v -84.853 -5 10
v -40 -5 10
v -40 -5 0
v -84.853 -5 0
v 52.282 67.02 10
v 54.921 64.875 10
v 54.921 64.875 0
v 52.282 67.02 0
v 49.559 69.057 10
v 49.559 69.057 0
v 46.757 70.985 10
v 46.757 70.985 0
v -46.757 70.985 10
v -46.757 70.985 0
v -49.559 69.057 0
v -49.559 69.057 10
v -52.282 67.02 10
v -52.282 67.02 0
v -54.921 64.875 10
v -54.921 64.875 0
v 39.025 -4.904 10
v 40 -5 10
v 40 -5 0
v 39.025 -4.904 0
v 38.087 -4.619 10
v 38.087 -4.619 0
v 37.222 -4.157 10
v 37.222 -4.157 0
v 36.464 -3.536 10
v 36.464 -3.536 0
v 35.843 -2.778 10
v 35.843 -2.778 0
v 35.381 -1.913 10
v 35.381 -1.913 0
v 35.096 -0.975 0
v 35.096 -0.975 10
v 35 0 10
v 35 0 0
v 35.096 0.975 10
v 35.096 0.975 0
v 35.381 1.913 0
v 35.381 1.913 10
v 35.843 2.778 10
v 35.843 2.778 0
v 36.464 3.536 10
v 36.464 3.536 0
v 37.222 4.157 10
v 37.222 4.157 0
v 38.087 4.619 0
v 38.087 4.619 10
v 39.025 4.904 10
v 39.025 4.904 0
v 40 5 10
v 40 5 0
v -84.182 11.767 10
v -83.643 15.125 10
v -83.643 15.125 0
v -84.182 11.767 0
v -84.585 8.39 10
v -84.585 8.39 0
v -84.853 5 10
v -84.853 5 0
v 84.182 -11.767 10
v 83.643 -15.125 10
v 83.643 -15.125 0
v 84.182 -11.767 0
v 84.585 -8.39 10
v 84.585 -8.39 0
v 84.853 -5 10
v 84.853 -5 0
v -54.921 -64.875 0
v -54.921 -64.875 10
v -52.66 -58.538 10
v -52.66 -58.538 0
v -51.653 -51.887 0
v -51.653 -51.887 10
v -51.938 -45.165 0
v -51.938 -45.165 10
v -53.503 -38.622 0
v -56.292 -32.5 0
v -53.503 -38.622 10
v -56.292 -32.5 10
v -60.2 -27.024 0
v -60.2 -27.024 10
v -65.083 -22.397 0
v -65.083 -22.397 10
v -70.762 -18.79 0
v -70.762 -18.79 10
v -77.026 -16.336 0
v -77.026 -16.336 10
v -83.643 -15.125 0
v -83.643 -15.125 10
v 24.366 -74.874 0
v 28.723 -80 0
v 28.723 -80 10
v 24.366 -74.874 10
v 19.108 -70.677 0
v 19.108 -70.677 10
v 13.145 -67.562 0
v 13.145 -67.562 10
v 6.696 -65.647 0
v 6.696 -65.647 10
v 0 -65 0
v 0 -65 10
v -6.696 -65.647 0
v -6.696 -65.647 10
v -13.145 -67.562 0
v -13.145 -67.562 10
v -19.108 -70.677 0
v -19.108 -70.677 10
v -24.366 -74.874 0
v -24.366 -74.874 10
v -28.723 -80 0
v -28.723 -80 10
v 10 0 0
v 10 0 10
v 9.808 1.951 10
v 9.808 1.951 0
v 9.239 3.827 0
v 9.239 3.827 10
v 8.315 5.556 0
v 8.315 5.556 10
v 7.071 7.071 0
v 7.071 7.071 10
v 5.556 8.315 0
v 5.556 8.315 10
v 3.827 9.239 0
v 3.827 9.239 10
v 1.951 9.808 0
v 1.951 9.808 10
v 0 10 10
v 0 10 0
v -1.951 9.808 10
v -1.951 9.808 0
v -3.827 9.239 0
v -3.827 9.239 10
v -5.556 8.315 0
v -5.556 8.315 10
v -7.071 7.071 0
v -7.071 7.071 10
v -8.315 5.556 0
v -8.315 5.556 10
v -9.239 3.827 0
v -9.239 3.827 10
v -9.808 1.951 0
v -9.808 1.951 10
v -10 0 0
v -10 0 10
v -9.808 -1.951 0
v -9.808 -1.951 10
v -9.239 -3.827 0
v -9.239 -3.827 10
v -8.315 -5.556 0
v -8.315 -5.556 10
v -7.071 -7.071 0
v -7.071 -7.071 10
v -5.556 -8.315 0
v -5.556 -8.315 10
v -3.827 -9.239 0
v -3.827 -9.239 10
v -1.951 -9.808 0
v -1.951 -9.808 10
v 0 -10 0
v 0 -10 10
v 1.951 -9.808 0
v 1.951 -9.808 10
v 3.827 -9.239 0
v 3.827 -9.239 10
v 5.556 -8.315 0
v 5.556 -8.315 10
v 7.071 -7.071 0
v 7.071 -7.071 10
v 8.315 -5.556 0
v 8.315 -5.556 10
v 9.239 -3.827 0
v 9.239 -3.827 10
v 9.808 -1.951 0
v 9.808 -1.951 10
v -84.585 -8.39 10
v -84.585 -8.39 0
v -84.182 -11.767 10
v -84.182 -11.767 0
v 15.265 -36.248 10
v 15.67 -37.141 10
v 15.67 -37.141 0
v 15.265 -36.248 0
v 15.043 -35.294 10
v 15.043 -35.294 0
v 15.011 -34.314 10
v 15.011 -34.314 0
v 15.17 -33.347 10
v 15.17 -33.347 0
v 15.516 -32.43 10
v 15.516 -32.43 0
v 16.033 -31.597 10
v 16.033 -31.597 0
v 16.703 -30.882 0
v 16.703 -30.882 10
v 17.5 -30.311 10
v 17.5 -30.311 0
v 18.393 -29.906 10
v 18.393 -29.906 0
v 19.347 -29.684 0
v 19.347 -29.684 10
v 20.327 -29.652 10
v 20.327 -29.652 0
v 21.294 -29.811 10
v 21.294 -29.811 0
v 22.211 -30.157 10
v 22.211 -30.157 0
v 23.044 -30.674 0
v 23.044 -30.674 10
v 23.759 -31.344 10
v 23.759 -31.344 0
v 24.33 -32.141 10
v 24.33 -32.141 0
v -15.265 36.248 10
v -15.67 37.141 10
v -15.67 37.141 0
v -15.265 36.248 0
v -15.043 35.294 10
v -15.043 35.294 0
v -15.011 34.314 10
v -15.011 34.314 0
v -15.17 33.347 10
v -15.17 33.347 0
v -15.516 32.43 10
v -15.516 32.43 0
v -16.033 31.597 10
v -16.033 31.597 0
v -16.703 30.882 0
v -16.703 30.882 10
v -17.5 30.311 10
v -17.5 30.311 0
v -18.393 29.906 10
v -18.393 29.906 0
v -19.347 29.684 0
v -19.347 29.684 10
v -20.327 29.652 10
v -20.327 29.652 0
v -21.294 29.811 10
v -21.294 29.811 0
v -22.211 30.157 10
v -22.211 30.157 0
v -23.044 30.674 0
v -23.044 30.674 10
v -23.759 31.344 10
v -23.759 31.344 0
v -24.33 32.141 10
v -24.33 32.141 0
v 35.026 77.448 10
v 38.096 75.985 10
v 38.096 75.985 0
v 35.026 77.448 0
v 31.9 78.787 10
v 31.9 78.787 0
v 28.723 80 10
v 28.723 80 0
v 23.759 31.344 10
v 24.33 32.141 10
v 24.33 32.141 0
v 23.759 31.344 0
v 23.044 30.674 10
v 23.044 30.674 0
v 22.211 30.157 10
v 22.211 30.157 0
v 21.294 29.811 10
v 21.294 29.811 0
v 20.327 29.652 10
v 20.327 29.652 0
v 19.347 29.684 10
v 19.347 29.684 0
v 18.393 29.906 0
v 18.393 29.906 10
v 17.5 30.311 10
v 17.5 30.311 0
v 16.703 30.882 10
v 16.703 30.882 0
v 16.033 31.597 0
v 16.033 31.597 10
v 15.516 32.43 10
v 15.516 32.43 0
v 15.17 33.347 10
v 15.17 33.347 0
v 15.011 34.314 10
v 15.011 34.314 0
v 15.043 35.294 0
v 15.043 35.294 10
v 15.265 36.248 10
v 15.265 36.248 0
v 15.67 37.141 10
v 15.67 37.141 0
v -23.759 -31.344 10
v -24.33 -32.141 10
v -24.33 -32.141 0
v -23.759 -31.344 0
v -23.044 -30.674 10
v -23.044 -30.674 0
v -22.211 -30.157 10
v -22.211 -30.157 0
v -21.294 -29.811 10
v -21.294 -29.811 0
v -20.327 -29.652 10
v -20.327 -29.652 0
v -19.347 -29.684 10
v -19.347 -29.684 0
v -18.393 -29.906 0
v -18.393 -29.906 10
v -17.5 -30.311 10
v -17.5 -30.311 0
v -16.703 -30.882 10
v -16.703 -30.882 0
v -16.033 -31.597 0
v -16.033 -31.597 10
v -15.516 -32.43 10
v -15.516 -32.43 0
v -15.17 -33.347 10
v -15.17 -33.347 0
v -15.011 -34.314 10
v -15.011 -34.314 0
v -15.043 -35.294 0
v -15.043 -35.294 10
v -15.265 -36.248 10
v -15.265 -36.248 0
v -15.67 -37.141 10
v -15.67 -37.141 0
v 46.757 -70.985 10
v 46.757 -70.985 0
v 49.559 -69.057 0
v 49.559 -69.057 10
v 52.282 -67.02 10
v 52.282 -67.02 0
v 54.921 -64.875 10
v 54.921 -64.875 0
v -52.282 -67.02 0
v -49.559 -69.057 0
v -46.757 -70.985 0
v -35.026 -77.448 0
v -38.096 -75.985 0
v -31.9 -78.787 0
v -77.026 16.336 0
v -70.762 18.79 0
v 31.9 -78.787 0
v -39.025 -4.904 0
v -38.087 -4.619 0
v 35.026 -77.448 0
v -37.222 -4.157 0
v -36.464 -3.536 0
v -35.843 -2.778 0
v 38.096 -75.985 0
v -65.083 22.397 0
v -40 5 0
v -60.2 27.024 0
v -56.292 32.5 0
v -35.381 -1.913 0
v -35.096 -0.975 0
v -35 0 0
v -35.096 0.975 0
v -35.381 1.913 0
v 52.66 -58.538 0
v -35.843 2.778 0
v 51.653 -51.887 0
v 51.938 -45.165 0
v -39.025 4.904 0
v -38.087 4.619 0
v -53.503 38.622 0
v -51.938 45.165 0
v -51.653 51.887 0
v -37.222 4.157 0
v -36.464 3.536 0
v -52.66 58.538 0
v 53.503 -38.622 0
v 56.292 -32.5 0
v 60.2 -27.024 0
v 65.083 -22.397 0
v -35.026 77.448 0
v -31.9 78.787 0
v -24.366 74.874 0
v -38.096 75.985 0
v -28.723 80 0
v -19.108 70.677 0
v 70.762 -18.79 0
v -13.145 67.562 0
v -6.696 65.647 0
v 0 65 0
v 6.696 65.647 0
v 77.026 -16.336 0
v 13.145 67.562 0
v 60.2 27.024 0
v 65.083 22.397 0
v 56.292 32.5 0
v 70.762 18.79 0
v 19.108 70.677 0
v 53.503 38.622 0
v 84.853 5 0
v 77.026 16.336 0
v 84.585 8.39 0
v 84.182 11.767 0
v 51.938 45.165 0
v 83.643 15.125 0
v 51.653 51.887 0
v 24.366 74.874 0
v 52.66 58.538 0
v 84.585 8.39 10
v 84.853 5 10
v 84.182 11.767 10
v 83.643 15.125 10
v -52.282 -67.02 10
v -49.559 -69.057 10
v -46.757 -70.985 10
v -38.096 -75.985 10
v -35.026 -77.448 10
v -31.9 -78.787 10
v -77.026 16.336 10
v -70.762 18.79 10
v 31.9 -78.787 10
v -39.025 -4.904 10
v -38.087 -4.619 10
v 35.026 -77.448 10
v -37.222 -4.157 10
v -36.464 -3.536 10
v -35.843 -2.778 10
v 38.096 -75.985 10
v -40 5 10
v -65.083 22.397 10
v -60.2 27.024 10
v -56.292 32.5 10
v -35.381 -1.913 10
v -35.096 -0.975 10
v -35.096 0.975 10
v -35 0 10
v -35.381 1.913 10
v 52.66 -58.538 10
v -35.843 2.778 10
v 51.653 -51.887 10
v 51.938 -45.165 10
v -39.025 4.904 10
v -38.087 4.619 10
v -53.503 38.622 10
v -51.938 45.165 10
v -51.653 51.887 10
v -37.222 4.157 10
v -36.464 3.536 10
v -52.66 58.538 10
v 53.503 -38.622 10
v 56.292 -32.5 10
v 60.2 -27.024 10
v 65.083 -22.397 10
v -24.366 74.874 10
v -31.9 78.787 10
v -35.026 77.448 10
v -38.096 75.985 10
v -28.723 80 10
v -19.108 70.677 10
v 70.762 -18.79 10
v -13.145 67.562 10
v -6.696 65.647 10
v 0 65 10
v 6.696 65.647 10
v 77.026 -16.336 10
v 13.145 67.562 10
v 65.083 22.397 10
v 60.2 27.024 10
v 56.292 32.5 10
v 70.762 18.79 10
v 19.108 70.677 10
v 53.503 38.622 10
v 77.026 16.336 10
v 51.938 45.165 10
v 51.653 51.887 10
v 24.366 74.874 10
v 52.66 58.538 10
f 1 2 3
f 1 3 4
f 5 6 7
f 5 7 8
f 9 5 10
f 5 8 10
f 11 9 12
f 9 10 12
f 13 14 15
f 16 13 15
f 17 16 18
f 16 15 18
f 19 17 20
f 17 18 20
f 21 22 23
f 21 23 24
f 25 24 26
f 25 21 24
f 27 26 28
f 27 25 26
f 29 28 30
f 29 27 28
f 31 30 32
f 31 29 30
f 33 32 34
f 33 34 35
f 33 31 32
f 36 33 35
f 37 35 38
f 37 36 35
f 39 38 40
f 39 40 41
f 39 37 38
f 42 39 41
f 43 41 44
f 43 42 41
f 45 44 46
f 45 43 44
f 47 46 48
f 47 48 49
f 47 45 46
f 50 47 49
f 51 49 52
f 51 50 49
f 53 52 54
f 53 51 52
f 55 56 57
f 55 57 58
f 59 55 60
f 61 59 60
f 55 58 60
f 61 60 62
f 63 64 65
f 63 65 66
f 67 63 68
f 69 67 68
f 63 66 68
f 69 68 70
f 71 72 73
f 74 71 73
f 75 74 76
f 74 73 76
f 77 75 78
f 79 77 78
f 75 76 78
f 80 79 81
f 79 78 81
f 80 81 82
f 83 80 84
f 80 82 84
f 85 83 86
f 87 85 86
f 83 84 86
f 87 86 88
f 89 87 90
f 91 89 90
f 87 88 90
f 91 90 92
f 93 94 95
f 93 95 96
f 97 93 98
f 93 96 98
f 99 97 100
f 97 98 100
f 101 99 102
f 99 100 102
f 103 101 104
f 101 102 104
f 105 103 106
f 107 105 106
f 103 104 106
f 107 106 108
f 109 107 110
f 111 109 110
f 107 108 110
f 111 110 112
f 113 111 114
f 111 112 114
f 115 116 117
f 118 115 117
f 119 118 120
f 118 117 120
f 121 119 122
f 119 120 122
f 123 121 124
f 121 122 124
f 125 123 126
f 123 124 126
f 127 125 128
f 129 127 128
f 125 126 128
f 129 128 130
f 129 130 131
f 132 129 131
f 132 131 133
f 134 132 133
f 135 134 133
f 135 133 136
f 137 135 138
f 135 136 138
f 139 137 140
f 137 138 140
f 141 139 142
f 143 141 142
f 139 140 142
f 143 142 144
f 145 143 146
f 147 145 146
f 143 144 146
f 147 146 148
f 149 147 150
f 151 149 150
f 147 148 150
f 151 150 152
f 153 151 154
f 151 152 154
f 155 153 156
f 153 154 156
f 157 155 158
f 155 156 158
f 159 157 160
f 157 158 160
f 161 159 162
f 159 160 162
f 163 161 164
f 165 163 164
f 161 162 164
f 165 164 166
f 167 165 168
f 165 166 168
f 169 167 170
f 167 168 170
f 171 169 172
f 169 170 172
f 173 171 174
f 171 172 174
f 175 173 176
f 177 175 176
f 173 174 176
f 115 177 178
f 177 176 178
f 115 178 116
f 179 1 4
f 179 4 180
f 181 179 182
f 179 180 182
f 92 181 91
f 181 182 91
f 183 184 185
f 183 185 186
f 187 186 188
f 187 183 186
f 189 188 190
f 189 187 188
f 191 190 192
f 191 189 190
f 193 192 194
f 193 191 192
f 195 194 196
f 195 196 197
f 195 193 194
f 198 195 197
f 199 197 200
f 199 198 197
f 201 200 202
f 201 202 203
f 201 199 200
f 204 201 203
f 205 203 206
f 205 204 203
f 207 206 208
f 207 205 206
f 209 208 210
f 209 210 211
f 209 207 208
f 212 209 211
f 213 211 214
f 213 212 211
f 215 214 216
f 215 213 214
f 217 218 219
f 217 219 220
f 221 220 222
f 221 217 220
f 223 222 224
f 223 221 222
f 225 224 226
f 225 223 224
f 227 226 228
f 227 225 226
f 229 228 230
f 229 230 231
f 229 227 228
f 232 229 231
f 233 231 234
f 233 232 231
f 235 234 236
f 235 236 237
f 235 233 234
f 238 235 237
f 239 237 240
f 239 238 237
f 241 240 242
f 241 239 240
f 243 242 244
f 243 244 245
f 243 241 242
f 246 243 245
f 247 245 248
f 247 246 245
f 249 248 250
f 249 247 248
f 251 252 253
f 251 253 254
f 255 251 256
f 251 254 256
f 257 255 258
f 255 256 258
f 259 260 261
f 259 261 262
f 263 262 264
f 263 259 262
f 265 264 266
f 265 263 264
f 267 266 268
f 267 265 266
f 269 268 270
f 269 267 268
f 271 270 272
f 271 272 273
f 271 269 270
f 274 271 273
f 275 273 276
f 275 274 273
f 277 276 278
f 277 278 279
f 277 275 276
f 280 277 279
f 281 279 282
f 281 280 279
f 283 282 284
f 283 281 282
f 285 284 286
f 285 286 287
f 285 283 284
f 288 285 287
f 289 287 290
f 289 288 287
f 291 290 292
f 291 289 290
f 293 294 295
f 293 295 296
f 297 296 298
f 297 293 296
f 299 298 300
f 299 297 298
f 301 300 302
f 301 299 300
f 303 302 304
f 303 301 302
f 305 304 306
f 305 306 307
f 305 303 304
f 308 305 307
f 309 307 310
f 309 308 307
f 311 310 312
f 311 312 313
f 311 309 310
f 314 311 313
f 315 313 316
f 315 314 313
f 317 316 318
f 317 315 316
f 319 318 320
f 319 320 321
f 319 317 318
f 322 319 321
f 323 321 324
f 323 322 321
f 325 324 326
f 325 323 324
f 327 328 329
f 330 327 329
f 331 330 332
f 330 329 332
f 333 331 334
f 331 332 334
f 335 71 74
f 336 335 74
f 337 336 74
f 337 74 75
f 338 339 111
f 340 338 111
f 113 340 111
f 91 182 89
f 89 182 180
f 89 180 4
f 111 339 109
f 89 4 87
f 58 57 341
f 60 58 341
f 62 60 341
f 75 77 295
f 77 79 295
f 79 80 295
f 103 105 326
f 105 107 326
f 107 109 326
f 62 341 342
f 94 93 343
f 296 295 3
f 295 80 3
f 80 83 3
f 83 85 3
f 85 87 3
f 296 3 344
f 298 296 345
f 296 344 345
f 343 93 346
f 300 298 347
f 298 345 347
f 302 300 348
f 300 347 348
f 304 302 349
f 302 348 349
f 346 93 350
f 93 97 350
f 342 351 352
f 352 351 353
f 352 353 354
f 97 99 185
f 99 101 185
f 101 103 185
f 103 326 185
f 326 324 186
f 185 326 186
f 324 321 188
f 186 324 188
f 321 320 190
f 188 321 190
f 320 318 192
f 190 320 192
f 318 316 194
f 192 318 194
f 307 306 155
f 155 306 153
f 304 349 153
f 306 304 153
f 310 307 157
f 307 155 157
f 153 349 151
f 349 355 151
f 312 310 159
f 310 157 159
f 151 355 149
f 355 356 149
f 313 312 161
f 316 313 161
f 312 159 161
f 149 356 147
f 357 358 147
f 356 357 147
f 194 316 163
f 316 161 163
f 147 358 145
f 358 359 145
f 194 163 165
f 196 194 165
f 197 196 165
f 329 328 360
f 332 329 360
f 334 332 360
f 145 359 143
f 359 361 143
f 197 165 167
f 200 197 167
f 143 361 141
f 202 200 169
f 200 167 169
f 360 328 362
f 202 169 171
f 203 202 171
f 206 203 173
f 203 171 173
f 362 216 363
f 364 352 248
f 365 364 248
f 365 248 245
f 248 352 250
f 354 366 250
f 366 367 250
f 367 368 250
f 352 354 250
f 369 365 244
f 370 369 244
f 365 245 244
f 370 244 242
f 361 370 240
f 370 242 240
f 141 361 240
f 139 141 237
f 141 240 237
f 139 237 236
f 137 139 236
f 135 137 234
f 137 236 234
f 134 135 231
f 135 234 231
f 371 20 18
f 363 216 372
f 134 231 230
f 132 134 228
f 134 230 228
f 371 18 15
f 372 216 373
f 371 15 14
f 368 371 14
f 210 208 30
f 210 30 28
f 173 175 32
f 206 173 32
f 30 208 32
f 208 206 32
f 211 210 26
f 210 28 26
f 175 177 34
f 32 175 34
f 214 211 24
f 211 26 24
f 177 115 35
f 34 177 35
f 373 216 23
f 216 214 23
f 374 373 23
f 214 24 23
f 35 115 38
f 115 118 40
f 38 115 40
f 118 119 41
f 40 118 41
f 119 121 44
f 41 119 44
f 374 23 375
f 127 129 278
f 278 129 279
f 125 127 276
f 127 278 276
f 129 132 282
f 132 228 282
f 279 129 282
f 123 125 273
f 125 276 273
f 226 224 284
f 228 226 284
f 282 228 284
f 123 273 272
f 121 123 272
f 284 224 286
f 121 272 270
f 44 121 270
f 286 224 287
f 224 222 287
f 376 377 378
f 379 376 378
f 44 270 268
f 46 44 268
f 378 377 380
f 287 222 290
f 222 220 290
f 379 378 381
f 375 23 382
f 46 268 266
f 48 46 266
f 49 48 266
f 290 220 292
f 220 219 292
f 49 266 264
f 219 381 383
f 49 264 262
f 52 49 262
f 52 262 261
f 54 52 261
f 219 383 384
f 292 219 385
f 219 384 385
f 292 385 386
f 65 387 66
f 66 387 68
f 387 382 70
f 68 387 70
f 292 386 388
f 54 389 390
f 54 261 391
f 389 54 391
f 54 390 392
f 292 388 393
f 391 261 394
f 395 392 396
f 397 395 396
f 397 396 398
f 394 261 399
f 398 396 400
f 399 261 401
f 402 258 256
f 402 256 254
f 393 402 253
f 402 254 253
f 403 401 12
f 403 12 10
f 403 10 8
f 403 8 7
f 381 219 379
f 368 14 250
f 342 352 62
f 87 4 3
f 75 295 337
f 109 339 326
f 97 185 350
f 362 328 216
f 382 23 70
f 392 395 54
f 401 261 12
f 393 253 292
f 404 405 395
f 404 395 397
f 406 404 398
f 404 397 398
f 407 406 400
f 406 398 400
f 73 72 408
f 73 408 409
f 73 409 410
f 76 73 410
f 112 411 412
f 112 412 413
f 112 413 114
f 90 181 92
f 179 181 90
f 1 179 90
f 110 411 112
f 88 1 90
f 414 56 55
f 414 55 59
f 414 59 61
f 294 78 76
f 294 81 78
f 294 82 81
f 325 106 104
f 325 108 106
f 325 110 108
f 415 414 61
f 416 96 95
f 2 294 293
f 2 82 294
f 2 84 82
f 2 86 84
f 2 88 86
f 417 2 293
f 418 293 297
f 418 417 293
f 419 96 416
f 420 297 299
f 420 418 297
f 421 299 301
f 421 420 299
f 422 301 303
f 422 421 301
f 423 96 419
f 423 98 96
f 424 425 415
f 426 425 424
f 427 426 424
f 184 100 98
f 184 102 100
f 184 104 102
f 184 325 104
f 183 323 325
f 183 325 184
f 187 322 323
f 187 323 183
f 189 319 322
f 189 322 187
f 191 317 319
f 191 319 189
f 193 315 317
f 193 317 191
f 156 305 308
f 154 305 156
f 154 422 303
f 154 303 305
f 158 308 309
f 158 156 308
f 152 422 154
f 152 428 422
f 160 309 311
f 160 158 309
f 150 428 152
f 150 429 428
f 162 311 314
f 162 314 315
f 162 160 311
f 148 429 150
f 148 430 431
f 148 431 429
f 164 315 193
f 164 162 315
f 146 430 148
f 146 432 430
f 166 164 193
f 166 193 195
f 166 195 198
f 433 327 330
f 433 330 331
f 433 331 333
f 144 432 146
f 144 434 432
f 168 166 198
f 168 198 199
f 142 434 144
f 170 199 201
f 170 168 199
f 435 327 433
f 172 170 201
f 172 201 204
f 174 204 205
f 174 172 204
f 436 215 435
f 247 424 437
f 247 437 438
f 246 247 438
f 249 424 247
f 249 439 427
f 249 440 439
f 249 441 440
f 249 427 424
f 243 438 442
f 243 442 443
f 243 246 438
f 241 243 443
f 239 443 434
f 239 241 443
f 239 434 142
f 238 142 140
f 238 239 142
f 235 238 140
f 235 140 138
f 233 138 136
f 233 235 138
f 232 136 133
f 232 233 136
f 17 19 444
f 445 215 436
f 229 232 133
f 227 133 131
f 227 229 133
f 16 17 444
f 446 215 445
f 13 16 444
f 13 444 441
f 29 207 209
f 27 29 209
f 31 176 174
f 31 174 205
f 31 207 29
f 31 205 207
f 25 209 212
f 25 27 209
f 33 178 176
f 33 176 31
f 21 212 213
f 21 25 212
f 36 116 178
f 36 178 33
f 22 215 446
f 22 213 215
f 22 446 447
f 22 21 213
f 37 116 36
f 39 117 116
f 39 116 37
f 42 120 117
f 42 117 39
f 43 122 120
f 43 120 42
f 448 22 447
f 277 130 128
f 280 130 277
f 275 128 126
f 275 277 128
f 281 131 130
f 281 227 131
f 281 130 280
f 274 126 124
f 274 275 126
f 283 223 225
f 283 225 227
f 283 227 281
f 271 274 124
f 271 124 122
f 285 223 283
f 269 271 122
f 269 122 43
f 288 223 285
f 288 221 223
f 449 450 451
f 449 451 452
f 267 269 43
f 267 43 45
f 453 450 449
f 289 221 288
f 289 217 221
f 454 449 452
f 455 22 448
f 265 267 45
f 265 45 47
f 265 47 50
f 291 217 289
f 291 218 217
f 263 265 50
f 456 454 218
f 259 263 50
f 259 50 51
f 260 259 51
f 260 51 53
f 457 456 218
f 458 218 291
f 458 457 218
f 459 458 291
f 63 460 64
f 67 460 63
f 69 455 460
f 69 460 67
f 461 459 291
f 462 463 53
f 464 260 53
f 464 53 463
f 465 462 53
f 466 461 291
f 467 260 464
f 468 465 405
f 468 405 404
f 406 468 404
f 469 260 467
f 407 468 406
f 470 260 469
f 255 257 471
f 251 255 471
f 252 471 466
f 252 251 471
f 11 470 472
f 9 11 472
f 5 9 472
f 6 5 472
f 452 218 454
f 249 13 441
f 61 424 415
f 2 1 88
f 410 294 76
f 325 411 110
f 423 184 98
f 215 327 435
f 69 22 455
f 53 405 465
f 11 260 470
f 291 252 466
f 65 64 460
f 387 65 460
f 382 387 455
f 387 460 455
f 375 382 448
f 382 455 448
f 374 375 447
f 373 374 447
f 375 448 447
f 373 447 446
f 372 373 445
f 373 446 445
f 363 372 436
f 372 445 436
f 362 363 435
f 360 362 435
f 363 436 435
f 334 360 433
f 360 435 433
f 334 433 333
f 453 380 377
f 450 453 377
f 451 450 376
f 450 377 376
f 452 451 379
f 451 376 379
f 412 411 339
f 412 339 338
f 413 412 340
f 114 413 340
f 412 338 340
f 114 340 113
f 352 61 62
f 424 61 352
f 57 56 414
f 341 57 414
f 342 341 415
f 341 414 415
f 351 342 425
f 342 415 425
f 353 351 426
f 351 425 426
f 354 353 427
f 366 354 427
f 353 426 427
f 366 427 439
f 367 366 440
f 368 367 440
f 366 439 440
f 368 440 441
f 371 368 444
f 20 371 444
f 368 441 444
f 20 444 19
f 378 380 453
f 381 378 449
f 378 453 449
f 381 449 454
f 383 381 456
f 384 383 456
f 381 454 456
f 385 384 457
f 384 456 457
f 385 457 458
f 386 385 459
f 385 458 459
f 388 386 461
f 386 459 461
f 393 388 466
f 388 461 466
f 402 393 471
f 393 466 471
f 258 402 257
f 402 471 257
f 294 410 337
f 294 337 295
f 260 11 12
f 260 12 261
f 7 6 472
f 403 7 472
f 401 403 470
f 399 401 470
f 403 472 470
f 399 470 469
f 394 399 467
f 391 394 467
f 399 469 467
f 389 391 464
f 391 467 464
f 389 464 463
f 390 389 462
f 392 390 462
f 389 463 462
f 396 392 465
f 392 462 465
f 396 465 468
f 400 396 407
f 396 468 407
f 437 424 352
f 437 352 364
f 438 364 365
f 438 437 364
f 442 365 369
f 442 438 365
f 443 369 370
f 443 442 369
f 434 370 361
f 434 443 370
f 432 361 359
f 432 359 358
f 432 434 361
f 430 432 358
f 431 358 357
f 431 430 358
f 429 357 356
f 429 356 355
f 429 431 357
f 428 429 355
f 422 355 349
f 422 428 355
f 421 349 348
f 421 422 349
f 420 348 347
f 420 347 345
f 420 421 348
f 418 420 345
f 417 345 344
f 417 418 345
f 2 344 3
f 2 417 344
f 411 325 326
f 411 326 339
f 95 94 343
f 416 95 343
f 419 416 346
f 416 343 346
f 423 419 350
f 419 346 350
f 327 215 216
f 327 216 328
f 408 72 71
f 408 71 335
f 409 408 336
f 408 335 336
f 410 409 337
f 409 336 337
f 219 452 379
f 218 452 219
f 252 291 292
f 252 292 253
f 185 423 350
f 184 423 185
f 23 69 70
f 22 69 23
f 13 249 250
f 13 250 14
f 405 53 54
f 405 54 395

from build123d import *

# Parameters (mm, degrees)
CROQUIS1_R              = 85
SALIENTE_EXTRUIR3_DEPTH = 10
CROQUIS3_R              = 10
CORTAR_EXTRUIR1_DEPTH   = 10
CORTAR_EXTRUIR2_DEPTH   = 10
MATRIZC1_COUNT          = 6
CROQUIS5_R              = 35
CORTAR_EXTRUIR3_DEPTH   = 10
MATRIZC2_COUNT          = 6


with BuildPart() as part:
    # Croquis1 → Saliente-Extruir3 (new body)
    with BuildSketch(Plane.XY):
        Circle(CROQUIS1_R)
    extrude(amount=SALIENTE_EXTRUIR3_DEPTH)

    # Croquis3 → Cortar-Extruir1 (cut)
    with BuildSketch(Plane.XY.offset(10)):
        Circle(CROQUIS3_R)
    extrude(amount=-CORTAR_EXTRUIR1_DEPTH, mode=Mode.SUBTRACT)

    # Croquis4 → Cortar-Extruir2 (cut)
    with BuildSketch(Plane.XY.offset(10)):
        with BuildLine():
            Line((40, 5), (99.874921777, 5))
            ThreePointArc((99.874921777, 5), (100, 0), (99.874921777, -5))
            Line((99.874921777, -5), (40, -5))
            ThreePointArc((40, -5), (35, 0), (40, 5))
        make_face()
    cortar_extruir2 = extrude(amount=-CORTAR_EXTRUIR2_DEPTH, mode=Mode.SUBTRACT)

    # MatrizC1: Cortar-Extruir2 ×6 about axis
    matrizc1_axis = Axis((0, 0, 0), (0, 0, 1))
    for i in range(1, MATRIZC1_COUNT):
        add(cortar_extruir2.rotate(matrizc1_axis, i * 360 / MATRIZC1_COUNT), mode=Mode.SUBTRACT)

    # Croquis5 → Cortar-Extruir3 (cut)
    with BuildSketch(Plane.XY.offset(10)):
        with Locations((86.602540378, 50)):
            Circle(CROQUIS5_R)
    cortar_extruir3 = extrude(amount=-CORTAR_EXTRUIR3_DEPTH, mode=Mode.SUBTRACT)

    # MatrizC2: Cortar-Extruir3 ×6 about axis
    matrizc2_axis = Axis((0, 0, 0), (0, 0, 1))
    for i in range(1, MATRIZC2_COUNT):
        add(cortar_extruir3.rotate(matrizc2_axis, i * 360 / MATRIZC2_COUNT), mode=Mode.SUBTRACT)


solid = part.part
